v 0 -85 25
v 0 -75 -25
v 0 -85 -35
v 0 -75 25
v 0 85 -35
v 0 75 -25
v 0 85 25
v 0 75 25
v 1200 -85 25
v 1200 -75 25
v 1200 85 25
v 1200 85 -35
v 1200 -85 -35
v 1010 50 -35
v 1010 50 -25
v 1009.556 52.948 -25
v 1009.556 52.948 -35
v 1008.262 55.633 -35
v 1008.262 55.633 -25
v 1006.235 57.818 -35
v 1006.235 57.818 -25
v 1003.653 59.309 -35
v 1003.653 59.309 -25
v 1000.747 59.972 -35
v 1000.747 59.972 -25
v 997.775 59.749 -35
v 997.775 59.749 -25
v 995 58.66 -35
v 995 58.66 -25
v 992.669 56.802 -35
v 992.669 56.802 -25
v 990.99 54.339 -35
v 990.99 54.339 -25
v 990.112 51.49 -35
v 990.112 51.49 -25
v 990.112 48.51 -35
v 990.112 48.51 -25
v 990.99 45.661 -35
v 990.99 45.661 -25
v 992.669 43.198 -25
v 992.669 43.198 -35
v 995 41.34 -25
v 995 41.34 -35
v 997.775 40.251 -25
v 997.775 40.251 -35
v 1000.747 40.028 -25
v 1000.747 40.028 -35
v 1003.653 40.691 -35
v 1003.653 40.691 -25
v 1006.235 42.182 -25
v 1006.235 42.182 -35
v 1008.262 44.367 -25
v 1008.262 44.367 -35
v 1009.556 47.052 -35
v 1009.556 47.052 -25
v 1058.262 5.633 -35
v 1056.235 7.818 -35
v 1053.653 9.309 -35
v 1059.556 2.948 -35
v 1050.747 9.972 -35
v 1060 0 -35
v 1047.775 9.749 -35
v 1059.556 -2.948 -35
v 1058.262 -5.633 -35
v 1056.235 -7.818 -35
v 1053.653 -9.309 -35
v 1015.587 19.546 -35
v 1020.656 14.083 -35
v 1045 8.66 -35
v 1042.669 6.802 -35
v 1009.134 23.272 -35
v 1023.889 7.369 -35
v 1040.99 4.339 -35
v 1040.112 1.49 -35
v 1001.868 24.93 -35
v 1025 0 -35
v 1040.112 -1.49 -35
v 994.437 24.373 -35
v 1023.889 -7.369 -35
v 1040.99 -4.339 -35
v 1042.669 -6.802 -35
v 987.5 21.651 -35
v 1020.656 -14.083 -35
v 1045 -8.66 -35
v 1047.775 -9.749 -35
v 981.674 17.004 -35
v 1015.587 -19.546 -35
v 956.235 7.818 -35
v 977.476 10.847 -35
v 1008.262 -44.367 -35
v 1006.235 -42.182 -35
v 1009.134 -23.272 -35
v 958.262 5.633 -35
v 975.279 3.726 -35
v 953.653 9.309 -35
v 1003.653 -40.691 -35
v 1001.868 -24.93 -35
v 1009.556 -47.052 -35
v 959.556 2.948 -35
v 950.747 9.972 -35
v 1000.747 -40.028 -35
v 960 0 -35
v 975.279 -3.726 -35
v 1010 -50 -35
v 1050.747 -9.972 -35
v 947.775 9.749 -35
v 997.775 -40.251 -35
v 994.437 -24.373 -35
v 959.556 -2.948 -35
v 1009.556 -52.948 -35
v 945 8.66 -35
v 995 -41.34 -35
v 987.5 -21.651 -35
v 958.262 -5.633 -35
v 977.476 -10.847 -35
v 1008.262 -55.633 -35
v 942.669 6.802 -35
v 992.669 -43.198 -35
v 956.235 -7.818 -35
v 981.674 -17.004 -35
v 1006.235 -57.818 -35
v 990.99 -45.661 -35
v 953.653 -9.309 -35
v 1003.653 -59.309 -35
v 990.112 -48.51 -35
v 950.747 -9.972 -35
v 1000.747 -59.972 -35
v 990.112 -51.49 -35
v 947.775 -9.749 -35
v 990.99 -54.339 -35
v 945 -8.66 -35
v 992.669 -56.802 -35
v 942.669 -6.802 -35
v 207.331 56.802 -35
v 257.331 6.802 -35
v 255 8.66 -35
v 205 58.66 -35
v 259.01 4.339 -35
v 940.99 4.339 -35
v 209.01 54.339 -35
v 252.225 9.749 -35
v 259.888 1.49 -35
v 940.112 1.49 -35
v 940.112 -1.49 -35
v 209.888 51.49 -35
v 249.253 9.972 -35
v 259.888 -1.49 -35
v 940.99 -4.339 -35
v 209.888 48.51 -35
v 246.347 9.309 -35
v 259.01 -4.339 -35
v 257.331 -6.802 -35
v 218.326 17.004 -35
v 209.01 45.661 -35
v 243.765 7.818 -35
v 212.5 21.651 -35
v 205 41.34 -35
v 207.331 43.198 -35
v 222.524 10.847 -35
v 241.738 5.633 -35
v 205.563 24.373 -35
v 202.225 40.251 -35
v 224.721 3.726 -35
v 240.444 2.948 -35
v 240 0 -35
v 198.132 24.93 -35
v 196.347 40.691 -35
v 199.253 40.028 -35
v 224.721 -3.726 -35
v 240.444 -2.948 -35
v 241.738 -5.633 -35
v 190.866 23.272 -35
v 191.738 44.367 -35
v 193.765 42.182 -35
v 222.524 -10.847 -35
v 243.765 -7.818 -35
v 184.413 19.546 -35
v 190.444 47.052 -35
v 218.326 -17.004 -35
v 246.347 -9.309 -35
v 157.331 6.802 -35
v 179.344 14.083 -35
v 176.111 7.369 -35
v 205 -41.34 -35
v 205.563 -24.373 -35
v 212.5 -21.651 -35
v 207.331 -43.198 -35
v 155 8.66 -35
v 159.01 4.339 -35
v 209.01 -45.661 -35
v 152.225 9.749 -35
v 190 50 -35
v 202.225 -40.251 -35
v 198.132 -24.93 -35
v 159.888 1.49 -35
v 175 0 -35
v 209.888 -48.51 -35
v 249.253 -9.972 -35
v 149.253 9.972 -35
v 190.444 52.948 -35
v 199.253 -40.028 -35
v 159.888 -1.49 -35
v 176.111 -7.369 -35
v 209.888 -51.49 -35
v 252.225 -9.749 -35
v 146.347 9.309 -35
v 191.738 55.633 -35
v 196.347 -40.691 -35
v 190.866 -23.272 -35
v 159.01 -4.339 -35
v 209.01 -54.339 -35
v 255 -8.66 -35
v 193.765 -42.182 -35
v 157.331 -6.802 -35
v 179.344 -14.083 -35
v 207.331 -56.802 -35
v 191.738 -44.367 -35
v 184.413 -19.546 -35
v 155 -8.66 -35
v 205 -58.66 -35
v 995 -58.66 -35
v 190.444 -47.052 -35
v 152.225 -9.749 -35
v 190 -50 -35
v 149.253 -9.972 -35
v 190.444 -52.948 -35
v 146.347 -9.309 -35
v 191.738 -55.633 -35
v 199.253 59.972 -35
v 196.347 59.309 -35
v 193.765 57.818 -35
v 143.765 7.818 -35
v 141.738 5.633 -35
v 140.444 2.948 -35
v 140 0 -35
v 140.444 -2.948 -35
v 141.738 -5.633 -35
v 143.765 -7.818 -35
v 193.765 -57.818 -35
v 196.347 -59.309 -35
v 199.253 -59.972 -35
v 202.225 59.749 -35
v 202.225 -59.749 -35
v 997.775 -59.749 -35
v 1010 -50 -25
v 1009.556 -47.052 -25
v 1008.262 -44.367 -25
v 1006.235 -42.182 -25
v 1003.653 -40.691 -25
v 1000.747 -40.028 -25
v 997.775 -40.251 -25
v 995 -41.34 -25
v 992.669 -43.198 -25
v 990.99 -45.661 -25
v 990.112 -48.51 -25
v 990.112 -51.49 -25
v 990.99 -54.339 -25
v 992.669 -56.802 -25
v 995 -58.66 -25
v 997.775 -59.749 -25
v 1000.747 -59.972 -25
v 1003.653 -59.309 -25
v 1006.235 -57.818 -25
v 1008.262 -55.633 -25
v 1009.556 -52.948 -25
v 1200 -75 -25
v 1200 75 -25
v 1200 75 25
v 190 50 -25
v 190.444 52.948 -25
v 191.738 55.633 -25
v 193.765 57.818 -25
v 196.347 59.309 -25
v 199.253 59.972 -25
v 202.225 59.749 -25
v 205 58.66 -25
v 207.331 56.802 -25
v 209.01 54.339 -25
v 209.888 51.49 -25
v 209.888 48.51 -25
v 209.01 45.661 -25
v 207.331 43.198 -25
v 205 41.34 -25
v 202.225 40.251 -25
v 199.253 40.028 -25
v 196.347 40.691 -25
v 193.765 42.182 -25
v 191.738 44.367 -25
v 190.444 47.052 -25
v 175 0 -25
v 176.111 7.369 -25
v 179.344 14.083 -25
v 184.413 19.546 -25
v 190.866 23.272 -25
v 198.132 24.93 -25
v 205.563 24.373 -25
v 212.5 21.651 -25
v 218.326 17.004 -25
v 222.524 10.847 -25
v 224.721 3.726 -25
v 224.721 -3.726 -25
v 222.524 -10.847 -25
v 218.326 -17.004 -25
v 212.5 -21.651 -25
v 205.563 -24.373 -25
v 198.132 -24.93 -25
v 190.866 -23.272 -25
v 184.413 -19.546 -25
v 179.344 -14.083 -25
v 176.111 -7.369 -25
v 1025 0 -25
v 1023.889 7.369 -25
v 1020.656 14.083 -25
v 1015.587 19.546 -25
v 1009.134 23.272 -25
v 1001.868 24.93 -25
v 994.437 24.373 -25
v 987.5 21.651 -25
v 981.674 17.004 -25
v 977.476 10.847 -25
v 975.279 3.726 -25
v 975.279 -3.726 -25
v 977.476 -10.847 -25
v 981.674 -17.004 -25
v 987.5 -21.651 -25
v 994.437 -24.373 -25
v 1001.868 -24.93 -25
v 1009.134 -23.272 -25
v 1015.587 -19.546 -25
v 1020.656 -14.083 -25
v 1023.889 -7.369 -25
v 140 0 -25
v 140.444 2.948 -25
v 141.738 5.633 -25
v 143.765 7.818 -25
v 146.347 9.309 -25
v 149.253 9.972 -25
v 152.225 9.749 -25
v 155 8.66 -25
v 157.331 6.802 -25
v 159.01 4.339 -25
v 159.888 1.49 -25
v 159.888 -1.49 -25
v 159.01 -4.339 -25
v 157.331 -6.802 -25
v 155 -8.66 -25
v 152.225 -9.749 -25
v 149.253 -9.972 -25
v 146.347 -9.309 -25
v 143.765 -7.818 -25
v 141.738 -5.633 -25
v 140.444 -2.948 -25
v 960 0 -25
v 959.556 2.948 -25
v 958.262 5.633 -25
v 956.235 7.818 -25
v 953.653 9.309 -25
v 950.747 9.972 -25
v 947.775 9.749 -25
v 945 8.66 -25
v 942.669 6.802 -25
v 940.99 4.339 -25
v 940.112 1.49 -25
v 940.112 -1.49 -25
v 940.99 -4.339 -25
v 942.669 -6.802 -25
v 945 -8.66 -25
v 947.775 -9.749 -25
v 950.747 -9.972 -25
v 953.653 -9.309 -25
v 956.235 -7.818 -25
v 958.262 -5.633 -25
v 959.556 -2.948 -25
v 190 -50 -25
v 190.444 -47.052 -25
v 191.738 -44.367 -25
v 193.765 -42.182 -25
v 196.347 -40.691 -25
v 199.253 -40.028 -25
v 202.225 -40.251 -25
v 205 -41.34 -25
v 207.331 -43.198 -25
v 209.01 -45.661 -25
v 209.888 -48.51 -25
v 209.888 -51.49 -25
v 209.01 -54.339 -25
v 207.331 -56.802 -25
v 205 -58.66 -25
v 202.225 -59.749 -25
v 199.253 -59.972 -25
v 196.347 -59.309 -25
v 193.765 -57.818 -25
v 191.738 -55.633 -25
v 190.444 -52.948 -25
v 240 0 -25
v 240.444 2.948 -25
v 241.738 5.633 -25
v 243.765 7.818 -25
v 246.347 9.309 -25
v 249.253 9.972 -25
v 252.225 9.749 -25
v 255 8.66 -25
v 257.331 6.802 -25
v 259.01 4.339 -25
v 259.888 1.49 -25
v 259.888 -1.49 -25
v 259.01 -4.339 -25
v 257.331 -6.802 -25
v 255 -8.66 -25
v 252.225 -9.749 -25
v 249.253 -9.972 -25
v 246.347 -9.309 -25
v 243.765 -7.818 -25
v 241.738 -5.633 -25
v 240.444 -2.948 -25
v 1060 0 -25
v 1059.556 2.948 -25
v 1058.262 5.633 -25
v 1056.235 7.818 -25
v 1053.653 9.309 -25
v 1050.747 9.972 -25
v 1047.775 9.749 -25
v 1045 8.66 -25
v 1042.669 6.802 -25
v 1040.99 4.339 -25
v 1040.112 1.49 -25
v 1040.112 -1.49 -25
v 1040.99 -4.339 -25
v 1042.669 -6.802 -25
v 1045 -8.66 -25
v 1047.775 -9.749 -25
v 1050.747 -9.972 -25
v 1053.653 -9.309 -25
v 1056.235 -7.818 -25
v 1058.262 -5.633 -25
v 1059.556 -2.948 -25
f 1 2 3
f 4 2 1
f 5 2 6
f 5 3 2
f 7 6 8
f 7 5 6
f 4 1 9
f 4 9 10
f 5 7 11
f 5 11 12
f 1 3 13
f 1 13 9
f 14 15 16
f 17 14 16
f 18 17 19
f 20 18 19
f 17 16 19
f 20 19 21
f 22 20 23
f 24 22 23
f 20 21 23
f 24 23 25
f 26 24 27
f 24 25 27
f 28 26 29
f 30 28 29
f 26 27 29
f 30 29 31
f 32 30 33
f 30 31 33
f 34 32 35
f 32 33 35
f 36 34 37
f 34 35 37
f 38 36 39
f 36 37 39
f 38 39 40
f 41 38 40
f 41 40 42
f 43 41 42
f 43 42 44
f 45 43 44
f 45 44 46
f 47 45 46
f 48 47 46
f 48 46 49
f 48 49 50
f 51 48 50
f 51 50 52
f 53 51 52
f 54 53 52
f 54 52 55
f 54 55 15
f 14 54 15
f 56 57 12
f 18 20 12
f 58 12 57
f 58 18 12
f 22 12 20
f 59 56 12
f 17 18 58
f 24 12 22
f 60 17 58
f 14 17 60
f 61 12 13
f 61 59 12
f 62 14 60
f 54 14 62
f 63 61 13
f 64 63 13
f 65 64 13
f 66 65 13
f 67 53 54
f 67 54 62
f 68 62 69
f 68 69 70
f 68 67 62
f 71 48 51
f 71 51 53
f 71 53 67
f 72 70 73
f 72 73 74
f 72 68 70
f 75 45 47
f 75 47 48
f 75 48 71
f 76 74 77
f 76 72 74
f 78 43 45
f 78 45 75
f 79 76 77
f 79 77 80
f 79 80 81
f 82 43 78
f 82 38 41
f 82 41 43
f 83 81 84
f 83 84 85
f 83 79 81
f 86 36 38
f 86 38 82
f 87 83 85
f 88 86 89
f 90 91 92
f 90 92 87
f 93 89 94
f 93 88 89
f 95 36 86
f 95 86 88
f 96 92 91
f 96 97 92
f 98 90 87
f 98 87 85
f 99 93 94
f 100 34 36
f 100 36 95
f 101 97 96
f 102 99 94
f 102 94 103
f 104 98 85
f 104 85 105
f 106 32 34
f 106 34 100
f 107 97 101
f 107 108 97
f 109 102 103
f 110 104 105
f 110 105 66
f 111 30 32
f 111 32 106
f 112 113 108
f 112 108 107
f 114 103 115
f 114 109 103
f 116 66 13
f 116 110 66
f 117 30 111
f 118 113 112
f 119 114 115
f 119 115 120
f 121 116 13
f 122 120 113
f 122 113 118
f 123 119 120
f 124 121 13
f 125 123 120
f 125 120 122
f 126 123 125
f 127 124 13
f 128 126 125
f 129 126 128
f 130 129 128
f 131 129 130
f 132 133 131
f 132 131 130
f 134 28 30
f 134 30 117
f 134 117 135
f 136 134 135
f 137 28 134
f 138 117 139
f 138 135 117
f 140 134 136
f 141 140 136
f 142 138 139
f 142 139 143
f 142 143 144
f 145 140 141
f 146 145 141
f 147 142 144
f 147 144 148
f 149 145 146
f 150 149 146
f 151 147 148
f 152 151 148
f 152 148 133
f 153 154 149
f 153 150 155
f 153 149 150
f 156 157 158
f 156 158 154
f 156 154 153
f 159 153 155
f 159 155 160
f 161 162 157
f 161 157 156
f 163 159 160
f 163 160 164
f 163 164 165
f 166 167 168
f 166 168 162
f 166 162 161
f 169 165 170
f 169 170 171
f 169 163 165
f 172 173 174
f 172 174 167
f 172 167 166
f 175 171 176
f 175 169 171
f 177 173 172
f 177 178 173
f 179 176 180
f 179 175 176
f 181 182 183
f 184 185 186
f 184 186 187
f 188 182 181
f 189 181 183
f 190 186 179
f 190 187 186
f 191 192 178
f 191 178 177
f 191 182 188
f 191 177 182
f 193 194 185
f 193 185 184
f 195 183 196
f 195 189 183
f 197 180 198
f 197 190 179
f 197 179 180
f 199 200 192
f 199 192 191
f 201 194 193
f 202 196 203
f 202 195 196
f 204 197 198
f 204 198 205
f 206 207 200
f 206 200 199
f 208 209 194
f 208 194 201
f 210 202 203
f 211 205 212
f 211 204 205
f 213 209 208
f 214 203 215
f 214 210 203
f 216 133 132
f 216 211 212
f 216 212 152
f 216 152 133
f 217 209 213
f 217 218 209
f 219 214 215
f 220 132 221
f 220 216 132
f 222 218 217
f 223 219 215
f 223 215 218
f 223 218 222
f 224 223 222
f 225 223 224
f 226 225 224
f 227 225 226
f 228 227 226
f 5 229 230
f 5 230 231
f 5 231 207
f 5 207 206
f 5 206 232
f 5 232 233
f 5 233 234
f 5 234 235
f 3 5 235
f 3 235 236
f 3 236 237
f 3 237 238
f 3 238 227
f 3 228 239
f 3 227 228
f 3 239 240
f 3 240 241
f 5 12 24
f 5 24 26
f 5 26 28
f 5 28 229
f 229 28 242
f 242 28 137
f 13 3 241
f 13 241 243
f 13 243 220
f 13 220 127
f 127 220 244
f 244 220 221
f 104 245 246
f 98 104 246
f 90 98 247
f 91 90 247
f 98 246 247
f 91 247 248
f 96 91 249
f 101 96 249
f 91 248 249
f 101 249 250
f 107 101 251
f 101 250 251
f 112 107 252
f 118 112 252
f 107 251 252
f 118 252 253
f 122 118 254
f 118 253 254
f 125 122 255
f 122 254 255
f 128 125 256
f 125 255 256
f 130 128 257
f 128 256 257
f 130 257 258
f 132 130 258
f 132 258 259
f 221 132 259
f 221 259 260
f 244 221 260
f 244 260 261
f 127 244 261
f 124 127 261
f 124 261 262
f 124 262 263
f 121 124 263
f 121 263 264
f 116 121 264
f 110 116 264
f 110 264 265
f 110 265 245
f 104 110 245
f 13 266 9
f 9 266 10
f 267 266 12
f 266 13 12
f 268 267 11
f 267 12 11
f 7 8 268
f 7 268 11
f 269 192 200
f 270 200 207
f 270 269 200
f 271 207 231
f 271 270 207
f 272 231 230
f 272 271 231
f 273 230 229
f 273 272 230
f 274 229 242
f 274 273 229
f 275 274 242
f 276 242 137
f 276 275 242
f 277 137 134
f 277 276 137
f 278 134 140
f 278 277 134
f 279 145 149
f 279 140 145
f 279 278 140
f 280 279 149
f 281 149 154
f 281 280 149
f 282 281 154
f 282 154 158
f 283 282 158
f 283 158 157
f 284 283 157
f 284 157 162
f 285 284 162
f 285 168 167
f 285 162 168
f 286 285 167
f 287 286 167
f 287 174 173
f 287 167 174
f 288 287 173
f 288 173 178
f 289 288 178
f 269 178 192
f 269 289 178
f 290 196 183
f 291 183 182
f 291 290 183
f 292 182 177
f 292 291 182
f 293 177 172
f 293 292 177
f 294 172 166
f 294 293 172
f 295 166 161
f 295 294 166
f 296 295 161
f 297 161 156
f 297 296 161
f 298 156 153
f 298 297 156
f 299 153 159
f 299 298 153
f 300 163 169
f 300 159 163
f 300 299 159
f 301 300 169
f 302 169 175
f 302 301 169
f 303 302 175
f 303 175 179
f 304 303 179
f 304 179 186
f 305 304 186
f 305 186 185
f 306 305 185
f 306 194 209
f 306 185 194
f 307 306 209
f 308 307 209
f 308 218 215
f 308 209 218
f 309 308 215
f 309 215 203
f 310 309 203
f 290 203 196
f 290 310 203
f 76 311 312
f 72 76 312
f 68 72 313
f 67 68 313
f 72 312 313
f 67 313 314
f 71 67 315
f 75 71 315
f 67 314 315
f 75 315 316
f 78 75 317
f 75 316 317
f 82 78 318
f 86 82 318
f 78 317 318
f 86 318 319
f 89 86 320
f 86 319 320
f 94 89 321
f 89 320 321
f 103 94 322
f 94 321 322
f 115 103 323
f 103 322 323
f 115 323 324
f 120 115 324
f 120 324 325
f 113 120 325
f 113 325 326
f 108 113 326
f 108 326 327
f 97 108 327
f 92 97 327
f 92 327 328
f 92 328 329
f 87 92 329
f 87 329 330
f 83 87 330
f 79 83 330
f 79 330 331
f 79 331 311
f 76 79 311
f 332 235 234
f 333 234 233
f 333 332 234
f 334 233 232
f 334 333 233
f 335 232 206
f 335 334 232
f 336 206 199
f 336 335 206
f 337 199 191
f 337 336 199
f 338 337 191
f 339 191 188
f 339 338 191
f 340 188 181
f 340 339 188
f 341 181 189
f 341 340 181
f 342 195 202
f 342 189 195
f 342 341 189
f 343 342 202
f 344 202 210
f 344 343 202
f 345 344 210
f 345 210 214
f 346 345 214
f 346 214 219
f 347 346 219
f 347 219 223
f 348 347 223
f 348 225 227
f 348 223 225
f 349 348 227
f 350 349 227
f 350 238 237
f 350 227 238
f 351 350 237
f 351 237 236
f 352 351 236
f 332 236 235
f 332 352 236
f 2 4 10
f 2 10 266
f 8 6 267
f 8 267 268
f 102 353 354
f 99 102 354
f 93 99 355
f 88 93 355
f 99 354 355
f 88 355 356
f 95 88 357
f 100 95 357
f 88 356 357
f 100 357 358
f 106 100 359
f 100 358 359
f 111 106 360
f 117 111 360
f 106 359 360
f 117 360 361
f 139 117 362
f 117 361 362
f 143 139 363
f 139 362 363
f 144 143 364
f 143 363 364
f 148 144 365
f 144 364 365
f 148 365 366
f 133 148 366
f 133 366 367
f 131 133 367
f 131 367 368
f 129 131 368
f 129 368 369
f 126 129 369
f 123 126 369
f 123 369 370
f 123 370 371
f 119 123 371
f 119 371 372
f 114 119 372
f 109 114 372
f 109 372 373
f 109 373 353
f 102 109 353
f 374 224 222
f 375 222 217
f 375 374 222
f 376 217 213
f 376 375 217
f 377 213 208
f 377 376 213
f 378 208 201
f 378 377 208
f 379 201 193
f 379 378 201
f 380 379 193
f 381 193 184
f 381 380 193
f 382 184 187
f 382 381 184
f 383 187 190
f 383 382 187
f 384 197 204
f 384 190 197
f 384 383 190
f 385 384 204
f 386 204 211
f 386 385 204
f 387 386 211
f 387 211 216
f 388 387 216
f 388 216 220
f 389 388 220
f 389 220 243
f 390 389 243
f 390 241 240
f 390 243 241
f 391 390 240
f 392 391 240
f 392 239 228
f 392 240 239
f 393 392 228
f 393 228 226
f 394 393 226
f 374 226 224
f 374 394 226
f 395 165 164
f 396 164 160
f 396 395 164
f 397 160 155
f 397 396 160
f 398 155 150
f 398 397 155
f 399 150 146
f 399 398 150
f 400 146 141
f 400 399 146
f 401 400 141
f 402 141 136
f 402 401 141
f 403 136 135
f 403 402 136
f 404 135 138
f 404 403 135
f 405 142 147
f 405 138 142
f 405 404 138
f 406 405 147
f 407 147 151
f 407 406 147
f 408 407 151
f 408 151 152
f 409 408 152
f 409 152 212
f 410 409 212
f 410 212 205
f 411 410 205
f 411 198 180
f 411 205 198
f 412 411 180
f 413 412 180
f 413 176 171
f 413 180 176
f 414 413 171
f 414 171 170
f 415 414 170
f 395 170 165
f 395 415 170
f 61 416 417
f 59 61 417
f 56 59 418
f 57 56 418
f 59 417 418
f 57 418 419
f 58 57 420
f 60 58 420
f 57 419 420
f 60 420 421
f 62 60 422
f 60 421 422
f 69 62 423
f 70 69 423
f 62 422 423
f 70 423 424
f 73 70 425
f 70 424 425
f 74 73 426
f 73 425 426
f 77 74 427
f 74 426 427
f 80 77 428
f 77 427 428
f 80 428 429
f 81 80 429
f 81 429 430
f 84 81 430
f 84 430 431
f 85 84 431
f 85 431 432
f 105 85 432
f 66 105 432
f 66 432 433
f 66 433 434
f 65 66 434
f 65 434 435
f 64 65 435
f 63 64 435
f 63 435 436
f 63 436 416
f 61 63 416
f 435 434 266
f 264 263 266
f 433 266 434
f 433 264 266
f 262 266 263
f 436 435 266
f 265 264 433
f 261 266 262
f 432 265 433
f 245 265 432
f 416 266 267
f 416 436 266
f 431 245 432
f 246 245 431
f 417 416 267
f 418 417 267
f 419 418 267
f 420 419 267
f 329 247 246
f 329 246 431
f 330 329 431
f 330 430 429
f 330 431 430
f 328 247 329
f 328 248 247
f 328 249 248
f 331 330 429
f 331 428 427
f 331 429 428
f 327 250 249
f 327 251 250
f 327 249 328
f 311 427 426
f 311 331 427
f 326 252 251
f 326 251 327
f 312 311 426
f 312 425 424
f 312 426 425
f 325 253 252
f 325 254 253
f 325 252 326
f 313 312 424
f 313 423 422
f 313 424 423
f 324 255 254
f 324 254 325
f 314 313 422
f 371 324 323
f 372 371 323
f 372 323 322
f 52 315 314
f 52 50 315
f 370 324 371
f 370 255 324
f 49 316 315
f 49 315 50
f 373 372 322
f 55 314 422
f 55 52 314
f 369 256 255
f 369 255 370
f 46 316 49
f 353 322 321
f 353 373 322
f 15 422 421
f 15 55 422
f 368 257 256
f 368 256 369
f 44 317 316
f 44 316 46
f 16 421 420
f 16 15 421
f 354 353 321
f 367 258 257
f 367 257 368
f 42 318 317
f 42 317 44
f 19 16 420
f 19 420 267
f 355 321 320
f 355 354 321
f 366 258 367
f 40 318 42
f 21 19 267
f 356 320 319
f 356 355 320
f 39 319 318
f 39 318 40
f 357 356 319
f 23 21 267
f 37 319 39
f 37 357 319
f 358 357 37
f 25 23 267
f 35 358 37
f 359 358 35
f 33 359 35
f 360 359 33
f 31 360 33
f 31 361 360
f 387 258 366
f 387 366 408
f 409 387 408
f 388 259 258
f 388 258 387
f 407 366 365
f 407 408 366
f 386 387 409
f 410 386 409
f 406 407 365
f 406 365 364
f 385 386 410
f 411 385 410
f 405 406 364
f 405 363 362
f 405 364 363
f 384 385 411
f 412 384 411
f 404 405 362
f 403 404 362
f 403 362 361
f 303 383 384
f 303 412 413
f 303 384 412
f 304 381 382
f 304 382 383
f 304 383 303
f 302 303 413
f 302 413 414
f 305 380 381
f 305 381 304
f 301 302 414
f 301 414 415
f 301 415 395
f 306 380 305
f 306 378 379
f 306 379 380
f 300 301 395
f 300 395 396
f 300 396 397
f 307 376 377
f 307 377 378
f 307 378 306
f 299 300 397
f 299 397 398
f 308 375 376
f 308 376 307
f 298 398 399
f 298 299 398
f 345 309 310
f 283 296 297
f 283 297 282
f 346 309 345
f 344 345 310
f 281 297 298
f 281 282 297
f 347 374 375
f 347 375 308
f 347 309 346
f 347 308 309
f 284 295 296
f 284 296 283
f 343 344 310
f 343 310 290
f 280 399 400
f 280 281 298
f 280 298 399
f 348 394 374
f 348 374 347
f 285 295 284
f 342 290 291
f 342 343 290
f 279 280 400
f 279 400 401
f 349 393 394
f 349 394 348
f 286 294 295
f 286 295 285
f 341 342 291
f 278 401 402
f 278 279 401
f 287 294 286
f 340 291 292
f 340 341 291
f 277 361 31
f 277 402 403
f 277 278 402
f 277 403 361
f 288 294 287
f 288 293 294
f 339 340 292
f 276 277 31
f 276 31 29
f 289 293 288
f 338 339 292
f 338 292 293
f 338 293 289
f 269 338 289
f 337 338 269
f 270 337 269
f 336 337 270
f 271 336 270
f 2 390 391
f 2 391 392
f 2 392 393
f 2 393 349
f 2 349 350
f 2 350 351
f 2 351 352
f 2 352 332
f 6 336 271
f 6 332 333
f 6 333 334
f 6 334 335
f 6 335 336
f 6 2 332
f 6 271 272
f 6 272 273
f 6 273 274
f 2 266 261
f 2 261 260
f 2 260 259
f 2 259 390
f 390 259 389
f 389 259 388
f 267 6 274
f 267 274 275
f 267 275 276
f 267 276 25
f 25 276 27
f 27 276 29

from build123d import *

# Parameters (mm, degrees)
BOSS_EXTRUDE2_DEPTH = 1200
SKETCH2_R           = 25
SKETCH2_R_2         = 10
CUT_EXTRUDE1_DEPTH  = 1200


with BuildPart() as part:
    # Sketch1 → Boss-Extrude2 (new body)
    with BuildSketch(Plane(origin=(0, 0, 0), x_dir=(0, 0, -1), z_dir=(1, 0, 0))):
        Polygon((-25, 75), (-25, 85), (35, 85), (35, -85), (-25, -85), (-25, -75), (25, -75), (25, 75), align=None)
    extrude(amount=BOSS_EXTRUDE2_DEPTH)

    # Sketch2 → Cut-Extrude1 (cut)
    with BuildSketch(Plane.XY.offset(-25)):
        with Locations((1000, 0)):
            Circle(SKETCH2_R)
        with Locations((950, 0)):
            Circle(SKETCH2_R_2)
        with Locations((1000, 50)):
            Circle(SKETCH2_R_2)
        with Locations((1000, -50)):
            Circle(SKETCH2_R_2)
        with Locations((1050, 0)):
            Circle(SKETCH2_R_2)
    cut_extrude1 = extrude(amount=-CUT_EXTRUDE1_DEPTH, mode=Mode.SUBTRACT)

    # Mirror2: Cut-Extrude1 across plane
    add(cut_extrude1.mirror(Plane(origin=(600, 0, 0), x_dir=(0, 0, 1), z_dir=(1, 0, 0))), mode=Mode.SUBTRACT)


solid = part.part
